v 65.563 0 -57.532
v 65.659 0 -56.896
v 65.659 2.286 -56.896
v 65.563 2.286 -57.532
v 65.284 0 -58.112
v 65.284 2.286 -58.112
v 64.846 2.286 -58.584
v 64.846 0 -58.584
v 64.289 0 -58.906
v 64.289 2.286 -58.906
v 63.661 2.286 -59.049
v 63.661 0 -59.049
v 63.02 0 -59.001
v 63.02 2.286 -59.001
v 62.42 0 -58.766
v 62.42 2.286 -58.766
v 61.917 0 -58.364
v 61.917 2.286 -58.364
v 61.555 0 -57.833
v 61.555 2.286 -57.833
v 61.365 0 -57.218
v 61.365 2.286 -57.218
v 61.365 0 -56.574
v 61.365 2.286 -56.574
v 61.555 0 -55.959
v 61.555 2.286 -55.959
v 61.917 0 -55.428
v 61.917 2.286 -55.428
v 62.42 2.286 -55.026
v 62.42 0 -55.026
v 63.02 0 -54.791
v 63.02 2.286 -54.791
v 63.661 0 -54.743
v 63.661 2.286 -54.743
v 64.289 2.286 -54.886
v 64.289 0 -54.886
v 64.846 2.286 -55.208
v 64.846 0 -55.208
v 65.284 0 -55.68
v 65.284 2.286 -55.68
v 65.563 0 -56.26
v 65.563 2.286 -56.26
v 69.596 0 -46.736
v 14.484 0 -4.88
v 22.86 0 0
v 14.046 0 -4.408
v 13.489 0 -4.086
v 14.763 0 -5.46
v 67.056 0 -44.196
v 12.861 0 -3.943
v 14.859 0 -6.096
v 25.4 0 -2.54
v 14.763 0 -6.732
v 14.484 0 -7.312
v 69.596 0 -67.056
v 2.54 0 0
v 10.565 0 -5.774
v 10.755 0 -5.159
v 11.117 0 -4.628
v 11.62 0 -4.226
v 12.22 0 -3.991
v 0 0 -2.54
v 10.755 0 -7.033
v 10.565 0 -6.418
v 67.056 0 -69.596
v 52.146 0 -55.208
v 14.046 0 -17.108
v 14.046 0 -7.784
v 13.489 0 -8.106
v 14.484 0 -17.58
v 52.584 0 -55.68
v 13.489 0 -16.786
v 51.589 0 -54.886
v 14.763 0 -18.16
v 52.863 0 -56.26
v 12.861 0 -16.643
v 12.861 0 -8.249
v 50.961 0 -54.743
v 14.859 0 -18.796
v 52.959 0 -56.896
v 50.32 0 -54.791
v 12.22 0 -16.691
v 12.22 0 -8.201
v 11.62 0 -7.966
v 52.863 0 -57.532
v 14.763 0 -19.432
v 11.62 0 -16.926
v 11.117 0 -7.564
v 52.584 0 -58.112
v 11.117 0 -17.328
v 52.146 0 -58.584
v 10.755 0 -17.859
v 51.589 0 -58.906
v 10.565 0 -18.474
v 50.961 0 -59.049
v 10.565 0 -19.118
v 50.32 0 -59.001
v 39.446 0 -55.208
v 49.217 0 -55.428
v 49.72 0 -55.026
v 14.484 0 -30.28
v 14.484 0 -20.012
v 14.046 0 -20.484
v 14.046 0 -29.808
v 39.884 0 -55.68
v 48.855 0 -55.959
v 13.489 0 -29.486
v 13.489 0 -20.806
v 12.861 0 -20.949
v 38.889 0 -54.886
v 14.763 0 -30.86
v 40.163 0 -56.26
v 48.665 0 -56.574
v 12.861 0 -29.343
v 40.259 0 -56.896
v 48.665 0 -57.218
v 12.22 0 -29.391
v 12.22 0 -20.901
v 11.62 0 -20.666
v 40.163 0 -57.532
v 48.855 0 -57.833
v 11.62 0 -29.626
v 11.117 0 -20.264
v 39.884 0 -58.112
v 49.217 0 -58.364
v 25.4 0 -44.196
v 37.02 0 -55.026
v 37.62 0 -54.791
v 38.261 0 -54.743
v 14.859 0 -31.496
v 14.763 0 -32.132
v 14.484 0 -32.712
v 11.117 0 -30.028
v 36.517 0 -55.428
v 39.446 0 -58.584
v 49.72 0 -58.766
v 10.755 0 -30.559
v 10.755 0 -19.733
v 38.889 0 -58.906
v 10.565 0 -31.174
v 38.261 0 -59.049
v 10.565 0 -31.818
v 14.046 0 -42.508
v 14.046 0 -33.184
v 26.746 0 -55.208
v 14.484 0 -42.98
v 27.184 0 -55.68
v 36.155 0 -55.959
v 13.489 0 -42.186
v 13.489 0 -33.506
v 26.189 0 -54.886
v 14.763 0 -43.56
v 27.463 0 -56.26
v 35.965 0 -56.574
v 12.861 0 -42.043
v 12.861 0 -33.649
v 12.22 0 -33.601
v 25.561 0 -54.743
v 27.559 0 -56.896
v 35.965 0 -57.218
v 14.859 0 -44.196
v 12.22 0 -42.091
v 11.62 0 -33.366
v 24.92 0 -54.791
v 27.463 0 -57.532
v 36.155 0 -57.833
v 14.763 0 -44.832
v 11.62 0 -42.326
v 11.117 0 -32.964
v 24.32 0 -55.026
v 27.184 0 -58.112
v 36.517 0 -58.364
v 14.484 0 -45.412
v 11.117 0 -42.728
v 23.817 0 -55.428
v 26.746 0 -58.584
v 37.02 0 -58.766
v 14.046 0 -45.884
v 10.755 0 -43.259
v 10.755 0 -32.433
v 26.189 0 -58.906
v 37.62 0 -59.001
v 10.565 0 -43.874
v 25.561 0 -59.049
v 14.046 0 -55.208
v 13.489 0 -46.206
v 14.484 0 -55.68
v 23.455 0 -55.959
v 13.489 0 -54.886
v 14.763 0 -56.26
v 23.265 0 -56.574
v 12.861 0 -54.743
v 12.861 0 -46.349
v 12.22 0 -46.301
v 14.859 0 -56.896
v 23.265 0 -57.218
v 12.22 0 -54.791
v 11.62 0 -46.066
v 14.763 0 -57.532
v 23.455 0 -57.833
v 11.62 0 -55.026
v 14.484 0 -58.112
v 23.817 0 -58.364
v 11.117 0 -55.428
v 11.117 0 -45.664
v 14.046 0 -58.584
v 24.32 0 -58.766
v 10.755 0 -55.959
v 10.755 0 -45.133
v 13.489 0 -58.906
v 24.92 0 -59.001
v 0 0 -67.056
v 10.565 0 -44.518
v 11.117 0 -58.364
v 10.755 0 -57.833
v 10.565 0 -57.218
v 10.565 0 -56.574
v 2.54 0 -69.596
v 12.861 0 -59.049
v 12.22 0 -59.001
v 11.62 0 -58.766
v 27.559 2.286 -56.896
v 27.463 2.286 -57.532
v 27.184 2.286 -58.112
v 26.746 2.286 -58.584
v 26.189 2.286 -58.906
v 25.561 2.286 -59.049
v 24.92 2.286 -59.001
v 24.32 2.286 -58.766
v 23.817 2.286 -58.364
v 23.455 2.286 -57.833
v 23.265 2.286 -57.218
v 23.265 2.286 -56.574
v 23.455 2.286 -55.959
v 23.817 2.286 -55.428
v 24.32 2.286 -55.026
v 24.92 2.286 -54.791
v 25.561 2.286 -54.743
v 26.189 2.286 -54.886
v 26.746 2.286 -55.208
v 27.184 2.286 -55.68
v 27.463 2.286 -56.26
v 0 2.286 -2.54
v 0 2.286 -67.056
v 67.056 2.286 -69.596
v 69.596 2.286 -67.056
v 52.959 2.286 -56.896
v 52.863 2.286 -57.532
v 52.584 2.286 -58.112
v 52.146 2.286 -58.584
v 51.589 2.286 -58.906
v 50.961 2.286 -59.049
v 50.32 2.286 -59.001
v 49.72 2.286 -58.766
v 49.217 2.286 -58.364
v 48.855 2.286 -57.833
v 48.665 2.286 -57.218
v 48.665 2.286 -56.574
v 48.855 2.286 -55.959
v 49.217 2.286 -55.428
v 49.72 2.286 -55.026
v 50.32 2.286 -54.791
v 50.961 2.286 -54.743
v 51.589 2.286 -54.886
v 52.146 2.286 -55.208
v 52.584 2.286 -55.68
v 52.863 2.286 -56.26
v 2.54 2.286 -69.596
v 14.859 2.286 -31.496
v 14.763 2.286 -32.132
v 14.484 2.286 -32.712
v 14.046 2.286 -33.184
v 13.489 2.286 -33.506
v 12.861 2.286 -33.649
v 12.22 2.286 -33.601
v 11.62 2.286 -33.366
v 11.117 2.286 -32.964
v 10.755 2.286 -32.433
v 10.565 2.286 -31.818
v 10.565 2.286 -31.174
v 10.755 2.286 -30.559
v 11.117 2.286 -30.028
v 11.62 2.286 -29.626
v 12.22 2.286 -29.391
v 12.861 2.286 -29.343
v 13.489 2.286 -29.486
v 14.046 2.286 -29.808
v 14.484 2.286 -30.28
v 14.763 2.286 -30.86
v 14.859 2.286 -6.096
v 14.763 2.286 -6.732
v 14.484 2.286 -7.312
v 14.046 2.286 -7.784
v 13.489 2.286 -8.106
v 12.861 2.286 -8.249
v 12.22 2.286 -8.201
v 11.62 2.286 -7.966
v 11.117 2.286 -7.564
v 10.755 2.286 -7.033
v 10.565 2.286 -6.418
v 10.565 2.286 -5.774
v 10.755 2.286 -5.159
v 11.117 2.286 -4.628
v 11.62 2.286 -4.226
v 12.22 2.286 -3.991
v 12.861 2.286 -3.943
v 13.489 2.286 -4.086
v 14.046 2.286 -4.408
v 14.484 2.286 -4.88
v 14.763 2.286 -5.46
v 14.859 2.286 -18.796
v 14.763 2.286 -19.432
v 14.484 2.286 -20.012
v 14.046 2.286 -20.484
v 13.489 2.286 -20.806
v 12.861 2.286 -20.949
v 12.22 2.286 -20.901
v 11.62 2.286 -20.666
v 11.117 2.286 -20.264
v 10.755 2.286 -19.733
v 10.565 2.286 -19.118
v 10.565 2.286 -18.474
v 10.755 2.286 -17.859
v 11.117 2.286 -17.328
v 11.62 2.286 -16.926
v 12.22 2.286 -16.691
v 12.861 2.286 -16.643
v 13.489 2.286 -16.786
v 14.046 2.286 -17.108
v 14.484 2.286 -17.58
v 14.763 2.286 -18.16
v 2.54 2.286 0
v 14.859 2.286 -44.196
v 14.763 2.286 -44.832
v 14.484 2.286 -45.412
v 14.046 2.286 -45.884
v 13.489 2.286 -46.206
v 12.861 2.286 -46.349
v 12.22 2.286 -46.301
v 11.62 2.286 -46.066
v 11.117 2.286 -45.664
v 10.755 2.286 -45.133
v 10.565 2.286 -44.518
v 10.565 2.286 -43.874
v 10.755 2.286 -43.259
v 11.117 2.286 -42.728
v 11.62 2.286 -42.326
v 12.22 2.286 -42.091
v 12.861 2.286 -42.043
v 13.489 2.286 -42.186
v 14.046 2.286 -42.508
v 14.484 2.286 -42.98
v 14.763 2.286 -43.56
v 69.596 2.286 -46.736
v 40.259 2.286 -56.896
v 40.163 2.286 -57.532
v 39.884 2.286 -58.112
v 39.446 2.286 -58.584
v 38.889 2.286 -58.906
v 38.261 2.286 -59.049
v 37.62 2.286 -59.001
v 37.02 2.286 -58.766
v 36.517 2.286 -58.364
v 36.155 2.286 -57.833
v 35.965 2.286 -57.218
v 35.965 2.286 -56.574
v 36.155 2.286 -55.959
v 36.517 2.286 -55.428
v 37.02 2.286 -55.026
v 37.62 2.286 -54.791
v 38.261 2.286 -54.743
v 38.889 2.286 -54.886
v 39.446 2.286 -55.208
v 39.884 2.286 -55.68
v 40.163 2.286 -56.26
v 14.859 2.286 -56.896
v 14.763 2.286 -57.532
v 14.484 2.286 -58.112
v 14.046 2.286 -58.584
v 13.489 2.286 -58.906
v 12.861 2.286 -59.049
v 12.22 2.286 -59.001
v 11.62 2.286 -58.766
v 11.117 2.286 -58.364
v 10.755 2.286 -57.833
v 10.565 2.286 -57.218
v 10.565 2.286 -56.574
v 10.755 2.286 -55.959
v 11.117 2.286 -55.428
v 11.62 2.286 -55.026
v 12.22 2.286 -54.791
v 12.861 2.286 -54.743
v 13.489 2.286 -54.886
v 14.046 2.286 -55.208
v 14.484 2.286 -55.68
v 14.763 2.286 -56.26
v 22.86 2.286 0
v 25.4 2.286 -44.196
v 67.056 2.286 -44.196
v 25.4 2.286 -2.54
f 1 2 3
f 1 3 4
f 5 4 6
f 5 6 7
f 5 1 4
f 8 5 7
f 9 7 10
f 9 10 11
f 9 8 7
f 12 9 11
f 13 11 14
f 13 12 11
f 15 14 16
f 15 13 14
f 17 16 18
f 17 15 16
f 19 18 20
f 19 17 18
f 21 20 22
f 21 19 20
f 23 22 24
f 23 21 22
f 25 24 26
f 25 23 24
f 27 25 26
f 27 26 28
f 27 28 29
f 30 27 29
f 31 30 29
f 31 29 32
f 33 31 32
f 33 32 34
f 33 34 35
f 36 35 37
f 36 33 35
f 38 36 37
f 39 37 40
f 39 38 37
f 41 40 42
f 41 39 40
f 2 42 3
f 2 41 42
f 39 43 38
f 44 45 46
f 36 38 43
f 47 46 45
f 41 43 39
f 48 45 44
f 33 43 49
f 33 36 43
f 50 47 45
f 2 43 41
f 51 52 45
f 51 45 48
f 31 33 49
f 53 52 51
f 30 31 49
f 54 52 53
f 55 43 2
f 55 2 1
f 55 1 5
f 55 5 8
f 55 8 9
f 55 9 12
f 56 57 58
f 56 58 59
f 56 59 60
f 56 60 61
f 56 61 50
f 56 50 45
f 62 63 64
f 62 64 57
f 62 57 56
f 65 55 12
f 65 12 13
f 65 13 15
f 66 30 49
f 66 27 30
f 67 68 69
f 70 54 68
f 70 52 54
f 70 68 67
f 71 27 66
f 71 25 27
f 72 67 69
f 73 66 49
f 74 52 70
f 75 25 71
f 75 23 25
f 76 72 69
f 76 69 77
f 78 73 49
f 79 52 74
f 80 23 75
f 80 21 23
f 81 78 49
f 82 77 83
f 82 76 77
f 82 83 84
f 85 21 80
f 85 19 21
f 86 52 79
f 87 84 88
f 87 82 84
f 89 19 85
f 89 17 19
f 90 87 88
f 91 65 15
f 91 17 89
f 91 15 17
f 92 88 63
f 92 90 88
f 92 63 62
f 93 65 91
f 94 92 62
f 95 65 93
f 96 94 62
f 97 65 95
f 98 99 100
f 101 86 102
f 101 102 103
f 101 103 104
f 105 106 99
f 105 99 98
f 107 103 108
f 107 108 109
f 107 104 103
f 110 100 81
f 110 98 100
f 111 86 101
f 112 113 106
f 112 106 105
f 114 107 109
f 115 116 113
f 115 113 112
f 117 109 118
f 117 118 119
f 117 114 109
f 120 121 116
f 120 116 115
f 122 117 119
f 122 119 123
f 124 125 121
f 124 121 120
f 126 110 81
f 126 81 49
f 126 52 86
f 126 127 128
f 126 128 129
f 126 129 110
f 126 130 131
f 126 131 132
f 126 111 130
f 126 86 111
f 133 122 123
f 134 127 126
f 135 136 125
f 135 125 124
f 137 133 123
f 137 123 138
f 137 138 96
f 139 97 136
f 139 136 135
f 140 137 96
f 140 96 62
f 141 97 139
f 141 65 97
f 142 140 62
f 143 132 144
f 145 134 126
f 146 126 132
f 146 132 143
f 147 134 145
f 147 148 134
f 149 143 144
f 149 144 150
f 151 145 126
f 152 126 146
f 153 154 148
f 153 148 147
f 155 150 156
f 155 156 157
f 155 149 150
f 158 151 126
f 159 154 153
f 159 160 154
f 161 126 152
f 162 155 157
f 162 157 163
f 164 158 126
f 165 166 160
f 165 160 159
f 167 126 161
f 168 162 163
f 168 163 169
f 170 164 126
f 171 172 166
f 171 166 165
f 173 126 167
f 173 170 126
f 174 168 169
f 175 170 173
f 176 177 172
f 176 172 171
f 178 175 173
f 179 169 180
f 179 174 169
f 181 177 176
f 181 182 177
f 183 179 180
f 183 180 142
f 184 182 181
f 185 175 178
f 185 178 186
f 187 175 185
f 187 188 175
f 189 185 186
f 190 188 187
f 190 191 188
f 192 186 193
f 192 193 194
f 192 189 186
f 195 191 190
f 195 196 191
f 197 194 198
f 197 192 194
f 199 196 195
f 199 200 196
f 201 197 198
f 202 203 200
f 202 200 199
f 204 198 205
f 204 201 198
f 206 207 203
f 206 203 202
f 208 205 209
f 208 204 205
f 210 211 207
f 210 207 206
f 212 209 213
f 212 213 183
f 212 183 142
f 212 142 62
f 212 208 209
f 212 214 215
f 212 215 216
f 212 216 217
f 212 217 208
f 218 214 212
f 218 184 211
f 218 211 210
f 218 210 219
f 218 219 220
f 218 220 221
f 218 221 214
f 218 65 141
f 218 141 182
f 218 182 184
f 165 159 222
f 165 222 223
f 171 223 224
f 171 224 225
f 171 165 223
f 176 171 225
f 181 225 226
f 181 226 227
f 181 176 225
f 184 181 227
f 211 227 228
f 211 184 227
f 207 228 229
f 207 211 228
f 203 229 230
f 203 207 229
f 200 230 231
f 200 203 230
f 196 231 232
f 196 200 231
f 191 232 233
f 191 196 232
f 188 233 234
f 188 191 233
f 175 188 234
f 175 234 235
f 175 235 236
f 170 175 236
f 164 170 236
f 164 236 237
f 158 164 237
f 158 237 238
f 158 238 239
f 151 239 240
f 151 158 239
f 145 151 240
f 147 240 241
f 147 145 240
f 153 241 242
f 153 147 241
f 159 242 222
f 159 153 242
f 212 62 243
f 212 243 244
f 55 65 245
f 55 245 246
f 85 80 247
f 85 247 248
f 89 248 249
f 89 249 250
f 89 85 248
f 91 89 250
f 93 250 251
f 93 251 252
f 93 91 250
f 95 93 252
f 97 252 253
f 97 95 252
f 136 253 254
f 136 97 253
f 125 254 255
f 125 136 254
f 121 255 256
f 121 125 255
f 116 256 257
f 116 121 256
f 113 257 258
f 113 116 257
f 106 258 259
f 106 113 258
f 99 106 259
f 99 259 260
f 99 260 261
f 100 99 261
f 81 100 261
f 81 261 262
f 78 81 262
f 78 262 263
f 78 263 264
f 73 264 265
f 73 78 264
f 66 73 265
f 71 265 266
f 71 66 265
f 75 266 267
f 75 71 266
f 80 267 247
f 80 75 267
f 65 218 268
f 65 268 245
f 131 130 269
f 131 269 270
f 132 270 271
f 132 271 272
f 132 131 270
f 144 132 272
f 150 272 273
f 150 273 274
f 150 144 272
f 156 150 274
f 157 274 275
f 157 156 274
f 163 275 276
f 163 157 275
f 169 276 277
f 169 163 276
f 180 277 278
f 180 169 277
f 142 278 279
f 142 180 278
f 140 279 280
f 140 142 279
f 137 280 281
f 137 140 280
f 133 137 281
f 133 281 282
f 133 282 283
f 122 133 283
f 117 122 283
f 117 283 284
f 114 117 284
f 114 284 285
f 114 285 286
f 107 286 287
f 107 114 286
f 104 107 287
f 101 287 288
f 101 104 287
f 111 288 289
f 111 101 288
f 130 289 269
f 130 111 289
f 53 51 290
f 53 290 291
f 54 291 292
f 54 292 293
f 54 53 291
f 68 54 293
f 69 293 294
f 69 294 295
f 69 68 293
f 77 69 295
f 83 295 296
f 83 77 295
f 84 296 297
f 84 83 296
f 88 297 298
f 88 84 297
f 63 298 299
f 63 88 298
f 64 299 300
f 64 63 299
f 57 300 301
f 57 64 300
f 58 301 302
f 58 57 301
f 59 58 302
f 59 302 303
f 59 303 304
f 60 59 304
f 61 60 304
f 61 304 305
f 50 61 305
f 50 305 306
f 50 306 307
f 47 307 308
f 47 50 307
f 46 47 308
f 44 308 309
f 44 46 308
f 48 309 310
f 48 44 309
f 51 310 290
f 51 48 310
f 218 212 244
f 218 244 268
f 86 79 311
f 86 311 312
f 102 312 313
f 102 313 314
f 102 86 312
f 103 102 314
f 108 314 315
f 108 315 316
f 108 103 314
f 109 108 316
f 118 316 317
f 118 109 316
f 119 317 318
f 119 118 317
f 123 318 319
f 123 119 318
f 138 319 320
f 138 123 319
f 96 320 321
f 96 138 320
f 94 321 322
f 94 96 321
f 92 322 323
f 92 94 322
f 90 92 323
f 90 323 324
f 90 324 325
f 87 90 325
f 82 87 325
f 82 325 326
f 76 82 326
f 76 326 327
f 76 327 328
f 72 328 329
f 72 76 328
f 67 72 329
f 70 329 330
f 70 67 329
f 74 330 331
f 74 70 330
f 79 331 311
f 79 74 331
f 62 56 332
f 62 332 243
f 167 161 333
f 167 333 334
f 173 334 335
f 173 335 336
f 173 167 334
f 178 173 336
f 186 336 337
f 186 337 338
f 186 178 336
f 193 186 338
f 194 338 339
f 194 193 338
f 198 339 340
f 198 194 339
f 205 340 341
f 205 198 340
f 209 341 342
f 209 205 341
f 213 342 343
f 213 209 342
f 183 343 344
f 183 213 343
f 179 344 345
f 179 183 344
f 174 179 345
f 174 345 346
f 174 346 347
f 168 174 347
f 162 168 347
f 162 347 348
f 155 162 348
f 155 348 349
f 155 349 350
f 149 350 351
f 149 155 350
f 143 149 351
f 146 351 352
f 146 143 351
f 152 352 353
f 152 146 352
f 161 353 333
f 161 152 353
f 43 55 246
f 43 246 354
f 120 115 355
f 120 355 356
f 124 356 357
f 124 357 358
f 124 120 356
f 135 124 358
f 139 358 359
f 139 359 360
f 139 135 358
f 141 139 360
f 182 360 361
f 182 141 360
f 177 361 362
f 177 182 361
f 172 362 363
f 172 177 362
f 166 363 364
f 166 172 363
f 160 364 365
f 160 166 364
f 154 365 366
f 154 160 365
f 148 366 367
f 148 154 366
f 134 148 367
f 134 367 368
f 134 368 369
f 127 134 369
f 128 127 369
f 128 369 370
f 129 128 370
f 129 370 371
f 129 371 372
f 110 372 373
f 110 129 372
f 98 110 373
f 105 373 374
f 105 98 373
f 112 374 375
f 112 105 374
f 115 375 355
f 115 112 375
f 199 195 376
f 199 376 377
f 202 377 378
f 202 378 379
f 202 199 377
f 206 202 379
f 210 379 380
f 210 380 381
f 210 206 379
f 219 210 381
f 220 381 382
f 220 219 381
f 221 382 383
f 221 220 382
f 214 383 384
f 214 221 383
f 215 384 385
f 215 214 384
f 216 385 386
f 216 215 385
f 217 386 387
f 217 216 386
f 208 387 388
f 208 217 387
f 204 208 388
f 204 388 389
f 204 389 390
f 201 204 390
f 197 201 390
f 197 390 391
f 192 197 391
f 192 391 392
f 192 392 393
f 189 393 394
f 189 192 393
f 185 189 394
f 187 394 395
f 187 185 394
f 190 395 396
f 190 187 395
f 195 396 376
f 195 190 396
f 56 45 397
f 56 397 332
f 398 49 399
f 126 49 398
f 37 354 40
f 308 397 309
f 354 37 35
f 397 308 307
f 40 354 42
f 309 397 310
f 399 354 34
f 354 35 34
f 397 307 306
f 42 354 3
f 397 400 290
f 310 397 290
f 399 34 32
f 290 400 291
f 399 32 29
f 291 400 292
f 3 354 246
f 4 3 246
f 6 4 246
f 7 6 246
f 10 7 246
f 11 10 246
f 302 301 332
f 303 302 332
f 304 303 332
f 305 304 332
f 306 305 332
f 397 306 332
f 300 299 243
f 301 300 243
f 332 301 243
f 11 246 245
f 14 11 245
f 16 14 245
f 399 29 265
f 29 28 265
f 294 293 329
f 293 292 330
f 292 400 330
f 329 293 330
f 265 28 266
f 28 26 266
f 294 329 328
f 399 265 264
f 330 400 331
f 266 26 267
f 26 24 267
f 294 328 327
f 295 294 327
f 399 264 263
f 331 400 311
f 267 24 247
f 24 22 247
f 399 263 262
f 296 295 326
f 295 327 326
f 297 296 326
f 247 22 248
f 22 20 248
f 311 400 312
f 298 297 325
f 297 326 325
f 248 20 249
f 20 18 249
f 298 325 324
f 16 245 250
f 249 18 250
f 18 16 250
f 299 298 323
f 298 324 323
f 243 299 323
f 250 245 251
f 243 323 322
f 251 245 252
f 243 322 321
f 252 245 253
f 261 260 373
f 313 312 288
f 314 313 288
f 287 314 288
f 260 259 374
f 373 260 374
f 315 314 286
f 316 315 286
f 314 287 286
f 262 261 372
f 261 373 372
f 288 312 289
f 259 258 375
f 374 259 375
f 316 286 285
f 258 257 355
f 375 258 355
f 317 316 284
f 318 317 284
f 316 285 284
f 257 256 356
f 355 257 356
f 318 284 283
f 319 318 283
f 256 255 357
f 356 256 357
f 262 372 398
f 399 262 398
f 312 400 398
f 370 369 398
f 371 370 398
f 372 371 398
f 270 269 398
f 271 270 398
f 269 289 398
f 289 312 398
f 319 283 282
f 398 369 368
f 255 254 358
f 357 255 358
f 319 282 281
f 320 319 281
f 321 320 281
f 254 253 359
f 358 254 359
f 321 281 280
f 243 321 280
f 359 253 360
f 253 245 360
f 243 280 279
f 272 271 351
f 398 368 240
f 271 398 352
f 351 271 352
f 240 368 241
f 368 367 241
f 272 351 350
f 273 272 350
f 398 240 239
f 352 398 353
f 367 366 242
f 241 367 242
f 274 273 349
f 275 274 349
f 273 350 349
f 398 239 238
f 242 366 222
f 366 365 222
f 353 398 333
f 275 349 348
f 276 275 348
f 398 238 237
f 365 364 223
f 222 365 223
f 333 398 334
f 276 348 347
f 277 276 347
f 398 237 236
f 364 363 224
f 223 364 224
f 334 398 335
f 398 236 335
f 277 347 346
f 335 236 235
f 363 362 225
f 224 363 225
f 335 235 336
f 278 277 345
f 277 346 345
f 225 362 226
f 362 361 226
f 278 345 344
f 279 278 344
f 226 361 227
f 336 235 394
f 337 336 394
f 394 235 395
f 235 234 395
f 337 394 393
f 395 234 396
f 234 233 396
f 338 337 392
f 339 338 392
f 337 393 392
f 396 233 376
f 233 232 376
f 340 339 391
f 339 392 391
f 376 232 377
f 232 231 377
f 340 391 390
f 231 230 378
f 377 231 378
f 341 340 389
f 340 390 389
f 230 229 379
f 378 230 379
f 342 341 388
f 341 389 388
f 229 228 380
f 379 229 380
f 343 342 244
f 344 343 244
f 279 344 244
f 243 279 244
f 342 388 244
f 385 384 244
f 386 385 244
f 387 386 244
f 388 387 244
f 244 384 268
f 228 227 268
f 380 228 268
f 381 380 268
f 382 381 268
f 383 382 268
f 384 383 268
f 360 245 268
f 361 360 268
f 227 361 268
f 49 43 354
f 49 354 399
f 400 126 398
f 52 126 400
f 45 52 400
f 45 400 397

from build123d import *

# Parameters (mm, degrees)
SKETCH1_R           = 2.159
BOSS_EXTRUDE1_DEPTH = 2.286


with BuildPart() as part:
    # Sketch1 → Boss-Extrude1 (new body)
    with BuildSketch(Plane(origin=(0, 0, 0), x_dir=(1, 0, 0), z_dir=(0, 1, 0))):
        Polygon((0, 2.54), (0, 67.056), (2.54, 69.596), (67.056, 69.596), (69.596, 67.056), (69.596, 46.736), (67.056, 44.196), (25.4, 44.196), (25.4, 2.54), (22.86, 0), (2.54, 0), align=None)
        with Locations((12.7, 56.896)):
            Circle(SKETCH1_R, mode=Mode.SUBTRACT)
        with Locations((25.4, 56.896)):
            Circle(SKETCH1_R, mode=Mode.SUBTRACT)
        with Locations((38.1, 56.896)):
            Circle(SKETCH1_R, mode=Mode.SUBTRACT)
        with Locations((50.8, 56.896)):
            Circle(SKETCH1_R, mode=Mode.SUBTRACT)
        with Locations((63.5, 56.896)):
            Circle(SKETCH1_R, mode=Mode.SUBTRACT)
        with Locations((12.7, 44.196)):
            Circle(SKETCH1_R, mode=Mode.SUBTRACT)
        with Locations((12.7, 31.496)):
            Circle(SKETCH1_R, mode=Mode.SUBTRACT)
        with Locations((12.7, 18.796)):
            Circle(SKETCH1_R, mode=Mode.SUBTRACT)
        with Locations((12.7, 6.096)):
            Circle(SKETCH1_R, mode=Mode.SUBTRACT)
    extrude(amount=BOSS_EXTRUDE1_DEPTH)


solid = part.part
